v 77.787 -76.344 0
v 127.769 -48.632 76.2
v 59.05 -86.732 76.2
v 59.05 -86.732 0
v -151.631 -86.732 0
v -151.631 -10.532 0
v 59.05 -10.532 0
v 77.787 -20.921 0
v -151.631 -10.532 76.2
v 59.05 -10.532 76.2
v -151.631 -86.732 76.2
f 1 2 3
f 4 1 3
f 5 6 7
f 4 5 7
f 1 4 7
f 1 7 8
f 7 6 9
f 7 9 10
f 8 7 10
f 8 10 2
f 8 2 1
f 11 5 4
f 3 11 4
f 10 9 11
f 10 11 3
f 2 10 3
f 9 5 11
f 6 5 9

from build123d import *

# Parameters (mm, degrees)
F0_W     = 279.4
F0_H     = 76.2
F1_DEPTH = 76.2
F3_DEPTH = 76.201
F5_DEPTH = 76.201


with BuildPart() as f1:
    # F0 (on Top) → F1 (new body)
    with BuildSketch(Plane.XY):
        with Locations((-11.931214, -48.632389)):
            Rectangle(F0_W, F0_H)
    extrude(amount=F1_DEPTH)

    # F2 (on face) → F3 (cut, through all)
    with BuildSketch(Plane.XZ.offset(86.732389)):
        Polygon((127.768786, 0), (127.768786, 76.2), (77.787049, 0), align=None)
    extrude(amount=-F3_DEPTH, mode=Mode.SUBTRACT)

    # F4 (on face) → F5 (cut, through all)
    with BuildSketch(Plane.XY.offset(76.2)):
        Polygon((59.04955, -10.532389), (127.768786, -48.632389), (127.768786, -10.532389), align=None)
        Polygon((127.768786, -48.632389), (59.04955, -86.732389), (127.768786, -86.732389), align=None)
    extrude(amount=-F5_DEPTH, mode=Mode.SUBTRACT)


solid = f1.part
